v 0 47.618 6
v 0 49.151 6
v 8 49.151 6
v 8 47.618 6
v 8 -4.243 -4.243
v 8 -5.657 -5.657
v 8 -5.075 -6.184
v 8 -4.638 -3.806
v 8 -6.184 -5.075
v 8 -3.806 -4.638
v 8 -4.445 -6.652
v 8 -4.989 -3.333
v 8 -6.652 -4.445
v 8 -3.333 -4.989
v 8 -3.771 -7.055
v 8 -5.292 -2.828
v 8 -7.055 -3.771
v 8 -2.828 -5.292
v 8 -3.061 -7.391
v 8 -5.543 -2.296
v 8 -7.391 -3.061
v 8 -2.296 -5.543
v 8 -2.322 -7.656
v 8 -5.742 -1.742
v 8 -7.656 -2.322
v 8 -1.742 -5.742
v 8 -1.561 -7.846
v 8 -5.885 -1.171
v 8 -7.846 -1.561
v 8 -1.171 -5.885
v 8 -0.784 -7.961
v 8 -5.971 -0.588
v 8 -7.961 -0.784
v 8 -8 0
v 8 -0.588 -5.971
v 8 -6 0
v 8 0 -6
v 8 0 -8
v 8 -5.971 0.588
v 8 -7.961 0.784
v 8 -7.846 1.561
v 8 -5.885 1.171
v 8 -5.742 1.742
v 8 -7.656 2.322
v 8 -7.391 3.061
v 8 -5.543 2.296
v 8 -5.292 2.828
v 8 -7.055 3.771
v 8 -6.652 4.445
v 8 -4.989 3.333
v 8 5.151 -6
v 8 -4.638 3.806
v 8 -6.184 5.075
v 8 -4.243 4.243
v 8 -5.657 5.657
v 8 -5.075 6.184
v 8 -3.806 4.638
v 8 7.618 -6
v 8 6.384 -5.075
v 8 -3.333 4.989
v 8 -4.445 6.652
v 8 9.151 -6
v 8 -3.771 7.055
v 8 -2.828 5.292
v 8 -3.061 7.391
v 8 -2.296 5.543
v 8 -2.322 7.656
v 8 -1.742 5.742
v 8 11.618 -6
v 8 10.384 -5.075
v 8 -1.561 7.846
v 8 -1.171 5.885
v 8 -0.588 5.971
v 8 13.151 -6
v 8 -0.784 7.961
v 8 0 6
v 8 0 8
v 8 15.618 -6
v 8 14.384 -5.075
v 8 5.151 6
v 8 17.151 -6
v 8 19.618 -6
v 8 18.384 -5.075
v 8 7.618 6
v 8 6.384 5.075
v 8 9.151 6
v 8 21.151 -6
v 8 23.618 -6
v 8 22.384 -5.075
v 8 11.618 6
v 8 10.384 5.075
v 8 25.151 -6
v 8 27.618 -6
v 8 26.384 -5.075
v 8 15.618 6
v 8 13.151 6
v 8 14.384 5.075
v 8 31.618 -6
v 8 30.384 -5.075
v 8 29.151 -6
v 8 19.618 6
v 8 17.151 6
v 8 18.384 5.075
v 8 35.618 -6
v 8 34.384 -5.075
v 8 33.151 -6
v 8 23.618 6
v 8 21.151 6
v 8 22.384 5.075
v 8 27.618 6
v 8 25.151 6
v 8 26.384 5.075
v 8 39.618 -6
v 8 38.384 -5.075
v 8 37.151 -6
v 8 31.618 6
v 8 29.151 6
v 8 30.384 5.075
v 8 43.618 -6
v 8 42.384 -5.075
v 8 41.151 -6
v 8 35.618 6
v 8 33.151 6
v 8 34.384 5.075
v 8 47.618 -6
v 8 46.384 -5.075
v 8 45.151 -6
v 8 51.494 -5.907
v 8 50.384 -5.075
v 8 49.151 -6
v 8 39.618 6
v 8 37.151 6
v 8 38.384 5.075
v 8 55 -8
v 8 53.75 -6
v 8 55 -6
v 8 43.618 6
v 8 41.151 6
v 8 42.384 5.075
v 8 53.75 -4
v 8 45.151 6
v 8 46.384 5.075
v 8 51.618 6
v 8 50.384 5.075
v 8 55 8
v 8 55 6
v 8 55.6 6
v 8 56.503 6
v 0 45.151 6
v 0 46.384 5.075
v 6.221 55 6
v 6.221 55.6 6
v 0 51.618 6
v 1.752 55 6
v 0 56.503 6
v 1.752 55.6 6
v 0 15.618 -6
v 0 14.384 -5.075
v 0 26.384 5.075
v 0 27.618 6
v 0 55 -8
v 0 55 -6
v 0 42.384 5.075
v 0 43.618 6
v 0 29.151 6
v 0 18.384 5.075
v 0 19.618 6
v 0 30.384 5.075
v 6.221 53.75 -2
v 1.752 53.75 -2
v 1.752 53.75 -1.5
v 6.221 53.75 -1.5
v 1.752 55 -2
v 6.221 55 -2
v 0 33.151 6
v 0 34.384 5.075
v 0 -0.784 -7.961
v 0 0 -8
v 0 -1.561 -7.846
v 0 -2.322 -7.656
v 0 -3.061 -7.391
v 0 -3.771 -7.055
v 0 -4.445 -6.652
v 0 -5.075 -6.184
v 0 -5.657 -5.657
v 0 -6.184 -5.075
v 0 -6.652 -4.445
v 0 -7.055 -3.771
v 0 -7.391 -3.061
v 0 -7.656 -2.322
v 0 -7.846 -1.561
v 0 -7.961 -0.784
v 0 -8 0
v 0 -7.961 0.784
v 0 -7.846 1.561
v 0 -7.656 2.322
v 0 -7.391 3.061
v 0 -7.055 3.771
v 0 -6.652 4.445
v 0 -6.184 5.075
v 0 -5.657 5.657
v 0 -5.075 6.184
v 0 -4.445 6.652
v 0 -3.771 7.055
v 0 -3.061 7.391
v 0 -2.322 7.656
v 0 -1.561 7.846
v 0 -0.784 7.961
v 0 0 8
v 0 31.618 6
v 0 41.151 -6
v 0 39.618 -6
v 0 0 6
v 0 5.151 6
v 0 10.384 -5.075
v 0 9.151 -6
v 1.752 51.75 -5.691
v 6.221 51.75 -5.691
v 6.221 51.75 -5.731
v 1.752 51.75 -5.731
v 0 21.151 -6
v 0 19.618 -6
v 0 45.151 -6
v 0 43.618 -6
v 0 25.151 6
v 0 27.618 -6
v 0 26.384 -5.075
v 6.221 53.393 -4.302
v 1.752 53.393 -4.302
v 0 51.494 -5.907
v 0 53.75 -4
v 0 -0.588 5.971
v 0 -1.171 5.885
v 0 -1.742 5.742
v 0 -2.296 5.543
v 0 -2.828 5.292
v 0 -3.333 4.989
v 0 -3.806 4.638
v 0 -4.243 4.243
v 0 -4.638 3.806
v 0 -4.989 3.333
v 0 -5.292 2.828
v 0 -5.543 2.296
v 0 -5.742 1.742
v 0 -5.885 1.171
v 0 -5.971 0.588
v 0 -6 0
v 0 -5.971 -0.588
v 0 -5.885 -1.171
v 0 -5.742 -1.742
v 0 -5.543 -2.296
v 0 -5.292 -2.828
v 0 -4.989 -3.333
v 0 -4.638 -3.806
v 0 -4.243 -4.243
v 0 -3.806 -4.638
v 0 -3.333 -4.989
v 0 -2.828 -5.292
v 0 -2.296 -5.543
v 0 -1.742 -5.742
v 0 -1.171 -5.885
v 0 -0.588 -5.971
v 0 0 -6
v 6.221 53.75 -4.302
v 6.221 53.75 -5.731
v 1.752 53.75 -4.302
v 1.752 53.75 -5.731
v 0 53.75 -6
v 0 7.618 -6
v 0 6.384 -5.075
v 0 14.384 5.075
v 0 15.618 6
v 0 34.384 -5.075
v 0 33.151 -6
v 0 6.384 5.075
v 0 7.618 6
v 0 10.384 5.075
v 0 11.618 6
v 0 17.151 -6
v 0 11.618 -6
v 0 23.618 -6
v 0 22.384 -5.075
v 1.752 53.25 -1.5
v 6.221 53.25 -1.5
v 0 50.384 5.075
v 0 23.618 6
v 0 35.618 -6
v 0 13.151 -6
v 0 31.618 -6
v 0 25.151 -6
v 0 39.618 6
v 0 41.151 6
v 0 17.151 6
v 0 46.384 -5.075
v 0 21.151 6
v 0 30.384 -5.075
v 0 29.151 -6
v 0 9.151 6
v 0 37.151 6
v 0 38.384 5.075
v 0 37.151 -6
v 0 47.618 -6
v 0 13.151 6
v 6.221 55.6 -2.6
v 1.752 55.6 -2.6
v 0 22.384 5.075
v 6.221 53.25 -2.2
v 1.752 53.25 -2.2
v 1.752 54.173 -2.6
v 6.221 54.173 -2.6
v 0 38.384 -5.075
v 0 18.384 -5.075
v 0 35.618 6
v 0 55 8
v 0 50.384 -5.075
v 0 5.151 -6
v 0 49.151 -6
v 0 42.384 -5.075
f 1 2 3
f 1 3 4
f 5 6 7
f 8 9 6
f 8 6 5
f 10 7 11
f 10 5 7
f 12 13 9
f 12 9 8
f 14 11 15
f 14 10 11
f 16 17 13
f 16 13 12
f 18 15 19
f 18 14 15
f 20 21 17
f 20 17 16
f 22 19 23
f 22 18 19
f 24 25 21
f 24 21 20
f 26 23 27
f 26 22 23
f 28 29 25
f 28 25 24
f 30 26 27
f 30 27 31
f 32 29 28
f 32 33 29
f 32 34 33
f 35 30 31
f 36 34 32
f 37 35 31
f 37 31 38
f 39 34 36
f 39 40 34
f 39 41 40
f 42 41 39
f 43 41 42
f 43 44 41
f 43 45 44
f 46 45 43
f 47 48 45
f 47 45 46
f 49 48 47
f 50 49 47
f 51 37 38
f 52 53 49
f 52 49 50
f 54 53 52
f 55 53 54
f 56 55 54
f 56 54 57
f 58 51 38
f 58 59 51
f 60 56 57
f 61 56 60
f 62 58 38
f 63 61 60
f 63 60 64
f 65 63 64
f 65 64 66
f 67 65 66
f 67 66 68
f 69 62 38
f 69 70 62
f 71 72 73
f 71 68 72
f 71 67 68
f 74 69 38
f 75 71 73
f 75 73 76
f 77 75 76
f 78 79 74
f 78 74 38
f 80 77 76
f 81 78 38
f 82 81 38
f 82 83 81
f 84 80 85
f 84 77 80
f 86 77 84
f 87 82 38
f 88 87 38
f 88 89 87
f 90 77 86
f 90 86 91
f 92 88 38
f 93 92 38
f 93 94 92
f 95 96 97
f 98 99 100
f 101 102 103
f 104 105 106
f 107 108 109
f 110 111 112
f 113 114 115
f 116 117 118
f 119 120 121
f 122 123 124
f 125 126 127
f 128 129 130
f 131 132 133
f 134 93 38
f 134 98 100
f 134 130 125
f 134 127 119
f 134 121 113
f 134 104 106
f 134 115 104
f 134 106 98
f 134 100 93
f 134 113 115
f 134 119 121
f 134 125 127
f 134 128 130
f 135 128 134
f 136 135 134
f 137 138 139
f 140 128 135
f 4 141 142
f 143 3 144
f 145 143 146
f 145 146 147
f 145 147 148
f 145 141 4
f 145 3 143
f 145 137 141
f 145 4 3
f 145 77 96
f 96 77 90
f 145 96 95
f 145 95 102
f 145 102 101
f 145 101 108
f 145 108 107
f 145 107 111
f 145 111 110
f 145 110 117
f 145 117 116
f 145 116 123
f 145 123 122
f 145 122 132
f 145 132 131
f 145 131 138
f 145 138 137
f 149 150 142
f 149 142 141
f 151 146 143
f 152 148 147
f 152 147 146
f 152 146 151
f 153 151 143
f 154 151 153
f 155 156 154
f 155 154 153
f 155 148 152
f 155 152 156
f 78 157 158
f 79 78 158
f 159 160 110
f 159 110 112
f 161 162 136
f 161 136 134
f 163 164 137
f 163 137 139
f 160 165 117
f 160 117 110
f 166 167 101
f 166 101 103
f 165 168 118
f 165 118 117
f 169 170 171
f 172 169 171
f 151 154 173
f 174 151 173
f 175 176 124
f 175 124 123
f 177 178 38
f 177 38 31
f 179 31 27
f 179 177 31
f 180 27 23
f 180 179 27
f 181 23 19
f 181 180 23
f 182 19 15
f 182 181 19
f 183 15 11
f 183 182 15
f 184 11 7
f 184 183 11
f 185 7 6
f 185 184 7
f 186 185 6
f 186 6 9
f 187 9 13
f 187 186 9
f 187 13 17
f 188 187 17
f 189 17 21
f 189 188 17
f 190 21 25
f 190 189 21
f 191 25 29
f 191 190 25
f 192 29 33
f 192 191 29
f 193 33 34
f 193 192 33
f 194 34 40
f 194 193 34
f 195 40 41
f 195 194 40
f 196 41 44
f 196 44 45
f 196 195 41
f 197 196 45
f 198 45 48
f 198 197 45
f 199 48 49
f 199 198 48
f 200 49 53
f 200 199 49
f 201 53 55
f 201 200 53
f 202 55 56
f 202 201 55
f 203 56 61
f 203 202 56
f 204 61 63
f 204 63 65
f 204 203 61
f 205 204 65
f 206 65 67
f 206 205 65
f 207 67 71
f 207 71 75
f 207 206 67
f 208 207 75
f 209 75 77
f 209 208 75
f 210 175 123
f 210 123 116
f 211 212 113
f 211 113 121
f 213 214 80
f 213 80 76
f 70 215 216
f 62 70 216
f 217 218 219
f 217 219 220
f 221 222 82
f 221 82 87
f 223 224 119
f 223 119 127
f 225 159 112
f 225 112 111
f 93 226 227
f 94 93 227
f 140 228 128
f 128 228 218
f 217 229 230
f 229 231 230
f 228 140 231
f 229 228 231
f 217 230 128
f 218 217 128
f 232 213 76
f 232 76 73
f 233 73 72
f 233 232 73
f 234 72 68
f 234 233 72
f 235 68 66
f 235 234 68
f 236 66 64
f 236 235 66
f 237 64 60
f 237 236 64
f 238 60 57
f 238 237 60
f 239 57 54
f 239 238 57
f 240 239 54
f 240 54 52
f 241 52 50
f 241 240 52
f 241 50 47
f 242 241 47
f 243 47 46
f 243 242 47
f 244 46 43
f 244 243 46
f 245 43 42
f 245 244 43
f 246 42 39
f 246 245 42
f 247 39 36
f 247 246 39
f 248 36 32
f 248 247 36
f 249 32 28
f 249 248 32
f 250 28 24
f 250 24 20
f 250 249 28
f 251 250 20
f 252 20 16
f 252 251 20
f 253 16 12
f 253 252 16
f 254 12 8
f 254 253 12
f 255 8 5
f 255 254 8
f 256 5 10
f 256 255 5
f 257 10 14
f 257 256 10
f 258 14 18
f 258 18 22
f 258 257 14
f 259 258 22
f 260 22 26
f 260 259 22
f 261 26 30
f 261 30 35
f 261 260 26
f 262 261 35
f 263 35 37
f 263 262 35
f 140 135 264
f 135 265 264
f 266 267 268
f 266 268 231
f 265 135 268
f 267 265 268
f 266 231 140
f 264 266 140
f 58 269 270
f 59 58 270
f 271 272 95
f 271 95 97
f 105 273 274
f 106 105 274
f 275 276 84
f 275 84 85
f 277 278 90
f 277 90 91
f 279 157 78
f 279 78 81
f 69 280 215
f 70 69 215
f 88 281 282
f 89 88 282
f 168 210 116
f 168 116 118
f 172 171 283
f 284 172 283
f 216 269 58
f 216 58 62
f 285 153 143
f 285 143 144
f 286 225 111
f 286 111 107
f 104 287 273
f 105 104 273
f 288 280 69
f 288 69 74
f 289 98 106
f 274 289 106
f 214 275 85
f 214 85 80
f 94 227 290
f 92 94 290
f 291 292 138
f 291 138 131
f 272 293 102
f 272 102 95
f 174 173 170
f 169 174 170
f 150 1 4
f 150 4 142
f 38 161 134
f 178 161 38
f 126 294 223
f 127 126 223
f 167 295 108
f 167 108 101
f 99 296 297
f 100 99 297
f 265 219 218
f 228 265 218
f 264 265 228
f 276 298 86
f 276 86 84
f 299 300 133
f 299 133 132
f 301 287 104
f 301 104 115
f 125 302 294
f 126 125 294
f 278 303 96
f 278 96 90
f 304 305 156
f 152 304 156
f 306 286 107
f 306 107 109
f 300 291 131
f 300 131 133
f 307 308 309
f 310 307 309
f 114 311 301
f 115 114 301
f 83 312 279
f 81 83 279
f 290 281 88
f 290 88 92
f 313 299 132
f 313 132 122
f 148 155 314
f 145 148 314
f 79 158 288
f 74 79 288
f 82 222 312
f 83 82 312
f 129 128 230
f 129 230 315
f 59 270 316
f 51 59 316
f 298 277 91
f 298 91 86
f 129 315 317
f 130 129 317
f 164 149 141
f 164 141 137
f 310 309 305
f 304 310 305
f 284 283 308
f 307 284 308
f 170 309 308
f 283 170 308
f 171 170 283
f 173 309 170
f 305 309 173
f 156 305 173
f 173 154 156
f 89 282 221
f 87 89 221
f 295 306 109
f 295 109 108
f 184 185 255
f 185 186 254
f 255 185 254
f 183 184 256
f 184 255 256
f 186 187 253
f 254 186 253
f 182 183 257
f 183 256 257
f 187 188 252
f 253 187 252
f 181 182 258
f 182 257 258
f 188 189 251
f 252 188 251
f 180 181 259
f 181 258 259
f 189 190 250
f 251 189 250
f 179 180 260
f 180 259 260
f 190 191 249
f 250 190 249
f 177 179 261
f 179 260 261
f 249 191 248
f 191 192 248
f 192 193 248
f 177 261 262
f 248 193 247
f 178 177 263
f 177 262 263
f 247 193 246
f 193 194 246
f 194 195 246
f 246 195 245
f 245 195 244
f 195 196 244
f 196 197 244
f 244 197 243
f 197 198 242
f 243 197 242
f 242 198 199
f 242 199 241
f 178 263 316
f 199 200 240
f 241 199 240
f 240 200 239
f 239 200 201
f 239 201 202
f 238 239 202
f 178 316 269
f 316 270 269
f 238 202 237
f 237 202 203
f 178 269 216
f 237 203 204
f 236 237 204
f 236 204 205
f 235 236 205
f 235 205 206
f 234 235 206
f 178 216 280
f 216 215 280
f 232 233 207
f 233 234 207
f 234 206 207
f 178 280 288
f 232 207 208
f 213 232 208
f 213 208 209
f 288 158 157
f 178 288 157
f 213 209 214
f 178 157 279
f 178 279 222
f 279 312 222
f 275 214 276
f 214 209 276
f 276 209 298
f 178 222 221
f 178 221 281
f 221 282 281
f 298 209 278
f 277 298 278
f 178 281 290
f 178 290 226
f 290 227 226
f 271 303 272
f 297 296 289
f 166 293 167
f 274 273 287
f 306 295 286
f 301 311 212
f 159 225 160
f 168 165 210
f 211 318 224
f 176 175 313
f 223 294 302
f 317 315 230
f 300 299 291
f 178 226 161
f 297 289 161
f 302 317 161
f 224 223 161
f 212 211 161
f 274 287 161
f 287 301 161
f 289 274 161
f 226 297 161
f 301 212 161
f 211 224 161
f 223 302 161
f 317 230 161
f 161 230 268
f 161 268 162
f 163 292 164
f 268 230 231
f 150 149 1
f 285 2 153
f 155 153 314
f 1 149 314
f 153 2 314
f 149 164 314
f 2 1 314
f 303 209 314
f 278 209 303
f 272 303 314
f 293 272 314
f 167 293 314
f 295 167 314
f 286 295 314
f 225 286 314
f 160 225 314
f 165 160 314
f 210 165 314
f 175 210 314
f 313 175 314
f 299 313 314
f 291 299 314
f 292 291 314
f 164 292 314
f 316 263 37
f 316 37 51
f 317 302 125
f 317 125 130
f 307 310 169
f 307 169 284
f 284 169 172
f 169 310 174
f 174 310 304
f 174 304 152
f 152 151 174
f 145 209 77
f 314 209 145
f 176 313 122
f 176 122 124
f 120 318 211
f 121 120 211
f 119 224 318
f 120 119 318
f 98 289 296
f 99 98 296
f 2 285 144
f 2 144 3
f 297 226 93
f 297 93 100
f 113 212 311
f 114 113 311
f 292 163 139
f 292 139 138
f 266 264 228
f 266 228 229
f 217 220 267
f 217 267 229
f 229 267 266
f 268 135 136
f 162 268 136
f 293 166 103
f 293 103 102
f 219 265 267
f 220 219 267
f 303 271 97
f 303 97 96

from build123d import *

# Parameters (mm, degrees)
BOSS_EXTRUDE1_DEPTH = 8
BOSS_EXTRUDE2_DEPTH = 8
BOSS_EXTRUDE4_DEPTH = 8
SKETCH10_W          = 4.468992015
SKETCH10_H          = 1.428902643
CUT_EXTRUDE2_DEPTH  = 2
SKETCH11_W          = 1.778541799
SKETCH11_H          = 8.6
SKETCH11_W_2        = 1.752466186
CUT_EXTRUDE4_DEPTH  = 2.5
CUT_EXTRUDE6_DEPTH  = 14.47


with BuildPart() as part:
    # Sketch2 → Boss-Extrude1 (new body)
    with BuildSketch(Plane.YZ):
        with BuildLine():
            Line((55, 6), (0, 6))
            ThreePointArc((0, 6), (-6, 0), (0, -6))
            Line((0, -6), (55, -6))
            Line((55, -6), (55, -8))
            Line((55, -8), (0, -8))
            ThreePointArc((0, -8), (-8, 0), (0, 8))
            Line((0, 8), (55, 8))
            Line((55, 8), (55, 6))
        make_face()
    extrude(amount=BOSS_EXTRUDE1_DEPTH)

    # Sketch8 → Boss-Extrude2 (add)
    with BuildSketch(Plane.YZ):
        Polygon((8.883709987, 6.2), (11.885253021, 6.2), (10.384481504, 5.074983791), align=None)
        Polygon((4.883709987, 6.2), (7.885253021, 6.2), (6.384481504, 5.074983791), align=None)
        Polygon((12.883709987, 6.2), (15.885253021, 6.2), (14.384481504, 5.074983791), align=None)
        Polygon((16.883709987, 6.2), (19.885253021, 6.2), (18.384481504, 5.074983791), align=None)
        Polygon((20.883709987, 6.2), (23.885253021, 6.2), (22.384481504, 5.074983791), align=None)
        Polygon((24.883709987, 6.2), (27.885253021, 6.2), (26.384481504, 5.074983791), align=None)
        Polygon((28.883709987, 6.2), (31.885253021, 6.2), (30.384481504, 5.074983791), align=None)
        Polygon((32.883709987, 6.2), (35.885253021, 6.2), (34.384481504, 5.074983791), align=None)
        Polygon((36.883709987, 6.2), (39.885253021, 6.2), (38.384481504, 5.074983791), align=None)
        Polygon((40.883709987, 6.2), (43.885253021, 6.2), (42.384481504, 5.074983791), align=None)
        Polygon((44.883709987, 6.2), (47.885253021, 6.2), (46.384481504, 5.074983791), align=None)
        Polygon((48.883709987, 6.2), (51.885253021, 6.2), (50.384481504, 5.074983791), align=None)
    boss_extrude2 = extrude(amount=BOSS_EXTRUDE2_DEPTH)

    # Mirror1: Boss-Extrude2 across plane
    add(boss_extrude2.mirror(Plane.XY))

    # Sketch9 → Boss-Extrude4 (add)
    with BuildSketch(Plane.YZ):
        Polygon((55, 6), (55, -2), (53.75, -2), (53.75, -1.5), (53.25, -1.5), (53.25, -2), (53.25, -2.6), (55.6, -2.6), (55.6, 6), (56.503482489, 6), (55, 8), align=None)
        Polygon((53.75, -4.000391414), (51.384098648, -6), (53.75, -6), align=None)
    extrude(amount=BOSS_EXTRUDE4_DEPTH)

    # Sketch10 → Cut-Extrude2 (cut)
    with BuildSketch(Plane(origin=(0, 53.75, 0), x_dir=(-1, 0, 0), z_dir=(0, 1, 0))):
        with Locations((-3.986962194, -5.0167747)):
            Rectangle(SKETCH10_W, SKETCH10_H)
    extrude(amount=-CUT_EXTRUDE2_DEPTH, mode=Mode.SUBTRACT)

    # Sketch11 → Cut-Extrude4 (cut)
    with BuildSketch(Plane(origin=(0, 55.6, 0), x_dir=(-1, 0, 0), z_dir=(0, 1, 0))):
        with Locations((-7.110729101, 1.7)):
            Rectangle(SKETCH11_W, SKETCH11_H)
        with Locations((-0.876233093, 1.7)):
            Rectangle(SKETCH11_W_2, SKETCH11_H)
    extrude(amount=-CUT_EXTRUDE4_DEPTH, mode=Mode.SUBTRACT)

    # Sketch12 → Cut-Extrude6 (cut)
    with BuildSketch(Plane(origin=(1.752466186, 0, 0), x_dir=(0, -1, 0), z_dir=(-1, 0, 0))):
        Polygon((-53.25, -2.6), (-53.25, -2.199701503), (-54.173023817, -2.6), (-53.75, -2.6), align=None)
    extrude(amount=-CUT_EXTRUDE6_DEPTH, mode=Mode.SUBTRACT)


solid = part.part
